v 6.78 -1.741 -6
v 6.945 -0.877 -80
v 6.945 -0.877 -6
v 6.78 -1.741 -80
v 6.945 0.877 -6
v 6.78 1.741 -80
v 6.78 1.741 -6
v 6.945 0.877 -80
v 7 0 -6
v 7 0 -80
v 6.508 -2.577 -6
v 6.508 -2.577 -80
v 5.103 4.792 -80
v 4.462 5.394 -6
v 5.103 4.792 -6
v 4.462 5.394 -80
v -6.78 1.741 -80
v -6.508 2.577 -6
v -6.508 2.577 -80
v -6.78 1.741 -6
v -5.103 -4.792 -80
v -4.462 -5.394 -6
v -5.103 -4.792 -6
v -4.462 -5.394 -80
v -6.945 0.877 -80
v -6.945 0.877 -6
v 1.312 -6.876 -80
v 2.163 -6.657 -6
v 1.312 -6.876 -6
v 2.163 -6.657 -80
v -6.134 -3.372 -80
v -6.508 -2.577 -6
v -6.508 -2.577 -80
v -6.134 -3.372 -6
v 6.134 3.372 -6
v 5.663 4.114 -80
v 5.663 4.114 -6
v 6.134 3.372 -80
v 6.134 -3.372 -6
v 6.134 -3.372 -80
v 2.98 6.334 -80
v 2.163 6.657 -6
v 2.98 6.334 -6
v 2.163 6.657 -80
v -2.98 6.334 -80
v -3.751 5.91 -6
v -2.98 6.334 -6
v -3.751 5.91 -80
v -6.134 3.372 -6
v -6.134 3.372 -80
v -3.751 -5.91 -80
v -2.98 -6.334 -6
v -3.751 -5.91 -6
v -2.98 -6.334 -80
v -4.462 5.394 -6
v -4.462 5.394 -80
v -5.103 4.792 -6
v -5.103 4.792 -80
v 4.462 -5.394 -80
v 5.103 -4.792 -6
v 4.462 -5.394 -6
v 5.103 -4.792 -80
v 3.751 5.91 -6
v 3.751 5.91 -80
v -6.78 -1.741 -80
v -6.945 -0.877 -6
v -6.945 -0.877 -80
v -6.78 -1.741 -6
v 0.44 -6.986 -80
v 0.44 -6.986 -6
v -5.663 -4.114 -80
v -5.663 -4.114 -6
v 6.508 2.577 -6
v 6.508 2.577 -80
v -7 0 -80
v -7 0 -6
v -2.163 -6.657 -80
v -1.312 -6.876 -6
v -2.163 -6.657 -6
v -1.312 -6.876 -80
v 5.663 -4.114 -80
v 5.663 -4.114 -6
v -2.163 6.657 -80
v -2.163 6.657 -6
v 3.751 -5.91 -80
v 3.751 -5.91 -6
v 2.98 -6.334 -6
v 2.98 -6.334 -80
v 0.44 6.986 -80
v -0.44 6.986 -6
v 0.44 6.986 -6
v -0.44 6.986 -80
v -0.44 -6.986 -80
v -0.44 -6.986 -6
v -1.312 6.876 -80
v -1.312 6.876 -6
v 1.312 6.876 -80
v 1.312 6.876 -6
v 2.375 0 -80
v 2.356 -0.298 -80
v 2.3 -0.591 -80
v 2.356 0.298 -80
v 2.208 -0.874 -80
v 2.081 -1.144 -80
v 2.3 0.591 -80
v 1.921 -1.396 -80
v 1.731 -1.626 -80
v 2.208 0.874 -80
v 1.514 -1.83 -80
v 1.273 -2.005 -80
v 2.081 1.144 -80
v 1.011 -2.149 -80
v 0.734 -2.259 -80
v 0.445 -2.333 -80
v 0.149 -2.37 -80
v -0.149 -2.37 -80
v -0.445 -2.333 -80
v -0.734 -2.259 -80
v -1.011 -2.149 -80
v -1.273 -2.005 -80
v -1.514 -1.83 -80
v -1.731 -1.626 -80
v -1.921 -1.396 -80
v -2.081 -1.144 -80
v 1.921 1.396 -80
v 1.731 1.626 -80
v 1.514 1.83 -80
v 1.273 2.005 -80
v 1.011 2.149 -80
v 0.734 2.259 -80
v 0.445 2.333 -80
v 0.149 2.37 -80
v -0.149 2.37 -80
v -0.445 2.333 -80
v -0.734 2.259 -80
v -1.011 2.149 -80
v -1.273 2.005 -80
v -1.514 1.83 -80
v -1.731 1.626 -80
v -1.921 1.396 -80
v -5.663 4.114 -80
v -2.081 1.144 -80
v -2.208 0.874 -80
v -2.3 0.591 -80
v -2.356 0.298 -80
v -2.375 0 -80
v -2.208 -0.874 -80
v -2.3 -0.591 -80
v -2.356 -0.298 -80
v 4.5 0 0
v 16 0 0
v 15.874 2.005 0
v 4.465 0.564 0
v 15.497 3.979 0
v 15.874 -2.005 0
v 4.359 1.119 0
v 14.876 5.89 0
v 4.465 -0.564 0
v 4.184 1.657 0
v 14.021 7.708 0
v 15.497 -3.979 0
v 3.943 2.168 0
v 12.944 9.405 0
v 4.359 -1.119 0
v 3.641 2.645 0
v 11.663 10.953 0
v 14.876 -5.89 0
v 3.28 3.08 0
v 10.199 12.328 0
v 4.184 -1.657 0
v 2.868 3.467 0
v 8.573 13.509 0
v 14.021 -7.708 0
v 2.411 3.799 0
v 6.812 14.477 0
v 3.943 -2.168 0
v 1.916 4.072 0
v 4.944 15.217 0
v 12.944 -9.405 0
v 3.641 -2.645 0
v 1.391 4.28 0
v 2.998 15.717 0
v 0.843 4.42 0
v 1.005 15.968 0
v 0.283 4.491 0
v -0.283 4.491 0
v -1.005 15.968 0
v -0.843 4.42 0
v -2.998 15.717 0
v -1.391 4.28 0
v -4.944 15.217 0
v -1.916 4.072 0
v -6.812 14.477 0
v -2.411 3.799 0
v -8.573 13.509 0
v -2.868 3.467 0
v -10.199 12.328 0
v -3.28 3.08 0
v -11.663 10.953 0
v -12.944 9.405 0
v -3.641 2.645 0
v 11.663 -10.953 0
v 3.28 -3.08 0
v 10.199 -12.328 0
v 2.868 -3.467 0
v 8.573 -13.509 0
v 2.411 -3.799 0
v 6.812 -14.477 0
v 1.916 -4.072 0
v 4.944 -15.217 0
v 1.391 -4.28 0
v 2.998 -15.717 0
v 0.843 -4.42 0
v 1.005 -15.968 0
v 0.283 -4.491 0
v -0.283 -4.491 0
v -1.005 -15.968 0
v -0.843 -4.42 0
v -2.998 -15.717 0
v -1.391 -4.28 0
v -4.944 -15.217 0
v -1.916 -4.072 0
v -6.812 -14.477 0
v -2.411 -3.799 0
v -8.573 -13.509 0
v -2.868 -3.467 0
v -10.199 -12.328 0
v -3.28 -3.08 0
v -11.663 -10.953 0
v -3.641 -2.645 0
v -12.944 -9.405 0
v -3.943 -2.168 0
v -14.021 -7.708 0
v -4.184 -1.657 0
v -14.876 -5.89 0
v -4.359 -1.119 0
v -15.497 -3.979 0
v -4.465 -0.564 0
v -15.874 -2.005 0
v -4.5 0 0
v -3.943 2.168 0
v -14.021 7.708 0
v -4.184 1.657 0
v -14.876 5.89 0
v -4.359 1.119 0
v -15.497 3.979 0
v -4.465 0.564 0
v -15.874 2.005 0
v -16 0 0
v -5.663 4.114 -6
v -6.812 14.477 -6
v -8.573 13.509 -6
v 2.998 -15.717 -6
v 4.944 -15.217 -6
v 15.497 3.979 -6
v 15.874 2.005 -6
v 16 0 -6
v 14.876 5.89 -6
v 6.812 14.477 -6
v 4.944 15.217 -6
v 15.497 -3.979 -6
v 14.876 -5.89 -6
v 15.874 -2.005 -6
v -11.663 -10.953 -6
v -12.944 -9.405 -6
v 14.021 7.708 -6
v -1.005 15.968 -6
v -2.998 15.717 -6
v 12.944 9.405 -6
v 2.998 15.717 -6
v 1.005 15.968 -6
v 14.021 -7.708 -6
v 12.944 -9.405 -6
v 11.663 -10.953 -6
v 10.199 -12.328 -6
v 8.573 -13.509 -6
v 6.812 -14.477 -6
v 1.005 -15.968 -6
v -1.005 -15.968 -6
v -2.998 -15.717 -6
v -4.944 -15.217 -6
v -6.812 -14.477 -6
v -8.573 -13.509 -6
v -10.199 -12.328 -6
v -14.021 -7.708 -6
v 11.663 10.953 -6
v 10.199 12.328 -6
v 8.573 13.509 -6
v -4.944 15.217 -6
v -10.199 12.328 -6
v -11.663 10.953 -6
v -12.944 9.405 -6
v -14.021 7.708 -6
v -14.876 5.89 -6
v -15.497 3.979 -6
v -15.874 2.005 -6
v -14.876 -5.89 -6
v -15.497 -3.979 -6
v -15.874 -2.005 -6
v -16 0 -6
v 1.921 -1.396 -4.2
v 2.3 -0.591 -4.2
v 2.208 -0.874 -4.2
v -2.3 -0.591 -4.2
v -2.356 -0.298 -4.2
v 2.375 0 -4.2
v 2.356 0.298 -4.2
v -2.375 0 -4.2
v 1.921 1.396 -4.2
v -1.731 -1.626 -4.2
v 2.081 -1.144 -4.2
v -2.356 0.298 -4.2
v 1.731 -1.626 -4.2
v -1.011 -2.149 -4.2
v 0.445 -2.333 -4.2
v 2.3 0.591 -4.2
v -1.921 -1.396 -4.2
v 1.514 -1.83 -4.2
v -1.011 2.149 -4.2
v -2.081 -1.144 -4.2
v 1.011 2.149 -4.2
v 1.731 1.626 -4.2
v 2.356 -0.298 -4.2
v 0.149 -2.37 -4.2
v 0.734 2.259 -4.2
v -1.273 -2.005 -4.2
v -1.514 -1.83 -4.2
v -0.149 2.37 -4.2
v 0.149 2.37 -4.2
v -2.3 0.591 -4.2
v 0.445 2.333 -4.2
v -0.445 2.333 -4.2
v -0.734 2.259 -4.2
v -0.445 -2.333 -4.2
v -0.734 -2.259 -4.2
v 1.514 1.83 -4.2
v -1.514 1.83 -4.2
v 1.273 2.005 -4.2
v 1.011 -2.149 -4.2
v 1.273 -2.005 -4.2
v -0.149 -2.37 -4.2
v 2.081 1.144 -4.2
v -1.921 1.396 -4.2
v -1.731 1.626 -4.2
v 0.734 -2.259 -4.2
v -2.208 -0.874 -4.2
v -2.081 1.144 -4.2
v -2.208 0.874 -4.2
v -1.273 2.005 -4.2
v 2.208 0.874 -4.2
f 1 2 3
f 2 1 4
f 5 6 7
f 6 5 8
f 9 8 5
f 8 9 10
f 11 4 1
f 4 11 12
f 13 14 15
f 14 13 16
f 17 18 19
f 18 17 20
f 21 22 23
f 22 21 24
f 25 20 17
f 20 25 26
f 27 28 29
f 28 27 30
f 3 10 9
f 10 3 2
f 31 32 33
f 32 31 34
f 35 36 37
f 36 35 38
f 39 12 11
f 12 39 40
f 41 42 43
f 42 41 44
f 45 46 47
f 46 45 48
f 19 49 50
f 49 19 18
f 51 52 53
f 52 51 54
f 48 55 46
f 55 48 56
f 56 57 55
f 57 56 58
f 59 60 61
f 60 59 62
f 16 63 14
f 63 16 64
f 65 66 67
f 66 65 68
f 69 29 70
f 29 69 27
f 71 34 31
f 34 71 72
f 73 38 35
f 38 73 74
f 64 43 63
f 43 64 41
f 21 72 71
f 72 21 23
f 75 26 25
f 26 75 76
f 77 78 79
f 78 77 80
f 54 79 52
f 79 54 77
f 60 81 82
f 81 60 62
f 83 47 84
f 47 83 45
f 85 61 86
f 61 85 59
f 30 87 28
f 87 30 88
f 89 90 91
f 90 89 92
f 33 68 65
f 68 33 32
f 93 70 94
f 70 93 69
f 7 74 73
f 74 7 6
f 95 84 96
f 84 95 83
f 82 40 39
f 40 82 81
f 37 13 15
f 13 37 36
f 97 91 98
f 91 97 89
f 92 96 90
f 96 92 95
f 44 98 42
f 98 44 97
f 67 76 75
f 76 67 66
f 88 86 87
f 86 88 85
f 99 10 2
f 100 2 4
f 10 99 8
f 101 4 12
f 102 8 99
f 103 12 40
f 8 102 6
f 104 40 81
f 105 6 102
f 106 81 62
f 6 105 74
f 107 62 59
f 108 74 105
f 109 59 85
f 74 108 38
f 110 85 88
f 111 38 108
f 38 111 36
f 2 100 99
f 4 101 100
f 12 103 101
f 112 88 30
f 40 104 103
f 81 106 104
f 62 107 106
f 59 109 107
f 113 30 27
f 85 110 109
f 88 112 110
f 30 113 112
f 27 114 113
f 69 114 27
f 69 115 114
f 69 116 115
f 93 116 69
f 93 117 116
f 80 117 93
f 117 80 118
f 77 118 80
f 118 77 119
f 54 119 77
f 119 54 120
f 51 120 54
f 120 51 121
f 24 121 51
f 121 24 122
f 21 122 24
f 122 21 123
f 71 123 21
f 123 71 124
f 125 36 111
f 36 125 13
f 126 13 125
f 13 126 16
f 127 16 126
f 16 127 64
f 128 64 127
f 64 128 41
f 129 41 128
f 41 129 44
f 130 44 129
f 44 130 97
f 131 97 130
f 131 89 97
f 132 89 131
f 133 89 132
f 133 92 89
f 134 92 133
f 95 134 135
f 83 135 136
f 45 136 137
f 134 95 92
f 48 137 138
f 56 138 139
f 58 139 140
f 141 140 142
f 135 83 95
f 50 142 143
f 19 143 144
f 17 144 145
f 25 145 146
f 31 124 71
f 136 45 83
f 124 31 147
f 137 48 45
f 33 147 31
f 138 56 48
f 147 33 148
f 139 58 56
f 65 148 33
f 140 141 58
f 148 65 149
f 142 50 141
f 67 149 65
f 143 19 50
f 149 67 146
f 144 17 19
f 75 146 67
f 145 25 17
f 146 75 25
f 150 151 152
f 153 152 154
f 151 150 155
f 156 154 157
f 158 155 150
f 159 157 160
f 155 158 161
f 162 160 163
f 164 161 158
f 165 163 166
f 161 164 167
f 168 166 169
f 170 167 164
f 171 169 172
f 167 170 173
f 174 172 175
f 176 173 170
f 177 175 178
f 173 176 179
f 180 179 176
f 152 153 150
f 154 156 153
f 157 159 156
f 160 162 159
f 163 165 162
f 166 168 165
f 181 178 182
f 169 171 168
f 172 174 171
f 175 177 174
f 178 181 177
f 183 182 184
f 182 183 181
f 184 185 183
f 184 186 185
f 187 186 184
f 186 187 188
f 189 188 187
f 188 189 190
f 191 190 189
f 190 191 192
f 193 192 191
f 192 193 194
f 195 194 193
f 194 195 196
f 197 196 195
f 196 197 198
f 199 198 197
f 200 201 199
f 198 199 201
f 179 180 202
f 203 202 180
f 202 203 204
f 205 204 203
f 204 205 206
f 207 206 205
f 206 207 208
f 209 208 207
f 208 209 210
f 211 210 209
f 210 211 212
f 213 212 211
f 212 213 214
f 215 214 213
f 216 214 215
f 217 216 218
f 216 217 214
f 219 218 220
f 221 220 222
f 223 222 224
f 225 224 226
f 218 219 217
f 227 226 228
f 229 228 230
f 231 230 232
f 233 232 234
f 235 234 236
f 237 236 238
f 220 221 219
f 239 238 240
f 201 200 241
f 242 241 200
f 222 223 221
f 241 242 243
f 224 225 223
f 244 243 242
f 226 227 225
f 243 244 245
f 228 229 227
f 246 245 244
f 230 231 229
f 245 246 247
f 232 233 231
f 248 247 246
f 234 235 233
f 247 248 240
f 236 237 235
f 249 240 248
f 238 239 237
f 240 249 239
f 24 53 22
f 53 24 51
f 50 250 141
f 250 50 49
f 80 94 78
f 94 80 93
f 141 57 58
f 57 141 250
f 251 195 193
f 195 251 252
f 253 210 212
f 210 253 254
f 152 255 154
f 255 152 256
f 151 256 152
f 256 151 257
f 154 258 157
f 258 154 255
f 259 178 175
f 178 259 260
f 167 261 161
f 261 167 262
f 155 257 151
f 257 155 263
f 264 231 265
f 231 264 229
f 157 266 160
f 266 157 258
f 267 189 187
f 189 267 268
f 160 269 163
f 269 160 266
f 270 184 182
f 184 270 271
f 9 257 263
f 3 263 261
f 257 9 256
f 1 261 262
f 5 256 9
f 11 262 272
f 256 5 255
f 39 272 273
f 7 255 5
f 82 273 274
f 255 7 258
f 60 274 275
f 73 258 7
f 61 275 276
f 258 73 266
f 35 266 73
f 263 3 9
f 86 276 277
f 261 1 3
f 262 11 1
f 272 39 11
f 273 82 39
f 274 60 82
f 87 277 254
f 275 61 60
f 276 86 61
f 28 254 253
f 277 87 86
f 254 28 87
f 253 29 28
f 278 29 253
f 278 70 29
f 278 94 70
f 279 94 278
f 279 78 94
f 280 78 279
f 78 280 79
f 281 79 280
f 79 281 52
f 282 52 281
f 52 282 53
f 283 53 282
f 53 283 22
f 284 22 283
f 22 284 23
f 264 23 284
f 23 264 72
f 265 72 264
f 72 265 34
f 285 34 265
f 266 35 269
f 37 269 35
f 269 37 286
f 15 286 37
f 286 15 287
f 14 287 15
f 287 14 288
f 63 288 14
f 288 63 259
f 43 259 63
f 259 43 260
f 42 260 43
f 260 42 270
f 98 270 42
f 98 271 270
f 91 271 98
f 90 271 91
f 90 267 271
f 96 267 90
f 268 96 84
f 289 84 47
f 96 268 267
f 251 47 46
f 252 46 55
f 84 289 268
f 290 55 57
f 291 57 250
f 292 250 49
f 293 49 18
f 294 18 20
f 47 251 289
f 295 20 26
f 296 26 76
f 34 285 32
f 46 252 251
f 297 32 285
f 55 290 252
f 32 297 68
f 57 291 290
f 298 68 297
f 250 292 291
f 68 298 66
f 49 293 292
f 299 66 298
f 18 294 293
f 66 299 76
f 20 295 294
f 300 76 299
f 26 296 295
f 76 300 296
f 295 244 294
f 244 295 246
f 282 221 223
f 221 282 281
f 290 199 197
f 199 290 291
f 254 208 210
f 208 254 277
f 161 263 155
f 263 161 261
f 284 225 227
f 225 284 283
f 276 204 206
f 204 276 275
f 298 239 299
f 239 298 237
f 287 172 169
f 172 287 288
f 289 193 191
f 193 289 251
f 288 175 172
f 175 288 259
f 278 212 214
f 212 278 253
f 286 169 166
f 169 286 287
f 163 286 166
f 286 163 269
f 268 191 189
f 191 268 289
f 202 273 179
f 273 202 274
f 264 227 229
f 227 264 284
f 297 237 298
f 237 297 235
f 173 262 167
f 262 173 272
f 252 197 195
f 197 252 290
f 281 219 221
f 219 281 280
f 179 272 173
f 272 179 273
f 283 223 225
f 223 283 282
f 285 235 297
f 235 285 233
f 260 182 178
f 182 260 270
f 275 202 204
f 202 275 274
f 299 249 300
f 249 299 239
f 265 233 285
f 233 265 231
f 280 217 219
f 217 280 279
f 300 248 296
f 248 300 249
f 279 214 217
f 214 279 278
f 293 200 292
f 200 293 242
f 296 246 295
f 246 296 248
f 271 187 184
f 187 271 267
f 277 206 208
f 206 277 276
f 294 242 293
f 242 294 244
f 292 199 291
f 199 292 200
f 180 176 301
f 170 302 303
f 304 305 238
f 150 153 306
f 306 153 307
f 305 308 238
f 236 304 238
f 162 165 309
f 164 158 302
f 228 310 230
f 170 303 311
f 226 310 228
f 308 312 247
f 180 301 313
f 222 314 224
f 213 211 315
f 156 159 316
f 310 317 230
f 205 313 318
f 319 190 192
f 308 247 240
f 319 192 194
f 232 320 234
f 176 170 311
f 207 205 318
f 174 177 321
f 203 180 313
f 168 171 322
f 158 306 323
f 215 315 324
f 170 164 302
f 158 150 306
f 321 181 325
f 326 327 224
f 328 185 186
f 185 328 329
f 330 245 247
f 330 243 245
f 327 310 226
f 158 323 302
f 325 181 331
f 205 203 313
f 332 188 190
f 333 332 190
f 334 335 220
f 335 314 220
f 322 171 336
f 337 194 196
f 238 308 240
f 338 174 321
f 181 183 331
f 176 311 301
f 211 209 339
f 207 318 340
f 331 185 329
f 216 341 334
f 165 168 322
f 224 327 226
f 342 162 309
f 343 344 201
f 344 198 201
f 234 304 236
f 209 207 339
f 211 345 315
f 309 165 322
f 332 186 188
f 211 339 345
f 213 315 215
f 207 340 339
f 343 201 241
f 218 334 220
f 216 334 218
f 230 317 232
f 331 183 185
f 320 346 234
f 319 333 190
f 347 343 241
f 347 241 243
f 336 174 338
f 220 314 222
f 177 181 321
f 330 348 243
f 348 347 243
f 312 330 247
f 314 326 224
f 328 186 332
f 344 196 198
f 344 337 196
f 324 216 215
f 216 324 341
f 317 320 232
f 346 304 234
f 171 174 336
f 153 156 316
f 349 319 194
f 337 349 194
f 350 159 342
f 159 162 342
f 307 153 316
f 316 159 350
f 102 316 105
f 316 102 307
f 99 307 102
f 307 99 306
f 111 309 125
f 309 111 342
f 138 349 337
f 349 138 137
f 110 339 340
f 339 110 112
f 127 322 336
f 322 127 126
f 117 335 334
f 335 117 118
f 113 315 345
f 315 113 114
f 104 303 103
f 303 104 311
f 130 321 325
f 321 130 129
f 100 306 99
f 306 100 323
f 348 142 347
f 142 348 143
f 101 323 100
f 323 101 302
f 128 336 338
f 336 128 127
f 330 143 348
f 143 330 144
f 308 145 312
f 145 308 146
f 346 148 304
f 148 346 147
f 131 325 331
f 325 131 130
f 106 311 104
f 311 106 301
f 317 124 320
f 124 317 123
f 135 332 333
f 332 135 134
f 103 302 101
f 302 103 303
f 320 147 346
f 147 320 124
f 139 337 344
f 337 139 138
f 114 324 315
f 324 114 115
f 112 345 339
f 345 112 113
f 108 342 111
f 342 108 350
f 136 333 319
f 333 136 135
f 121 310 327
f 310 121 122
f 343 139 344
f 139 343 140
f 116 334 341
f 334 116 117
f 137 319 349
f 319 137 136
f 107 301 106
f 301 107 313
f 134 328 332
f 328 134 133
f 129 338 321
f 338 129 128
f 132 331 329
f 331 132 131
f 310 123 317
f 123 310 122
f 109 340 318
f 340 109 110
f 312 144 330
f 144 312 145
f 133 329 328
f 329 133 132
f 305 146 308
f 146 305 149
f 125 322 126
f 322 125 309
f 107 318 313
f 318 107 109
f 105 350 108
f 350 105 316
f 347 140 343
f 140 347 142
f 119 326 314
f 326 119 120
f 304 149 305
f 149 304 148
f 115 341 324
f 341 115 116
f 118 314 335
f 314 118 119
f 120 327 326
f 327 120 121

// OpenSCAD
$fn = 50;


difference() {
	union() {
		translate(v = [0, 0, -80.0000000000]) {
			cylinder(h = 80, r = 7.0000000000);
		}
		translate(v = [0, 0, -6.0000000000]) {
			cylinder(h = 6, r = 16.0000000000);
		}
	}
	union() {
		translate(v = [0, 0, 0]) {
			rotate(a = [0, 0, 0]) {
				difference() {
					union() {
						#translate(v = [0, 0, -80.0000000000]) {
							cylinder(h = 80, r = 2.2500000000);
						}
						#translate(v = [0, 0, -4.2000000000]) {
							cylinder(h = 4.2000000000, r1 = 2.3750000000, r2 = 4.5000000000);
						}
						#translate(v = [0, 0, -80.0000000000]) {
							cylinder(h = 80, r = 2.3750000000);
						}
						#translate(v = [0, 0, -80.0000000000]) {
							cylinder(h = 80, r = 2.2500000000);
						}
					}
					union();
				}
			}
		}
	}
}
